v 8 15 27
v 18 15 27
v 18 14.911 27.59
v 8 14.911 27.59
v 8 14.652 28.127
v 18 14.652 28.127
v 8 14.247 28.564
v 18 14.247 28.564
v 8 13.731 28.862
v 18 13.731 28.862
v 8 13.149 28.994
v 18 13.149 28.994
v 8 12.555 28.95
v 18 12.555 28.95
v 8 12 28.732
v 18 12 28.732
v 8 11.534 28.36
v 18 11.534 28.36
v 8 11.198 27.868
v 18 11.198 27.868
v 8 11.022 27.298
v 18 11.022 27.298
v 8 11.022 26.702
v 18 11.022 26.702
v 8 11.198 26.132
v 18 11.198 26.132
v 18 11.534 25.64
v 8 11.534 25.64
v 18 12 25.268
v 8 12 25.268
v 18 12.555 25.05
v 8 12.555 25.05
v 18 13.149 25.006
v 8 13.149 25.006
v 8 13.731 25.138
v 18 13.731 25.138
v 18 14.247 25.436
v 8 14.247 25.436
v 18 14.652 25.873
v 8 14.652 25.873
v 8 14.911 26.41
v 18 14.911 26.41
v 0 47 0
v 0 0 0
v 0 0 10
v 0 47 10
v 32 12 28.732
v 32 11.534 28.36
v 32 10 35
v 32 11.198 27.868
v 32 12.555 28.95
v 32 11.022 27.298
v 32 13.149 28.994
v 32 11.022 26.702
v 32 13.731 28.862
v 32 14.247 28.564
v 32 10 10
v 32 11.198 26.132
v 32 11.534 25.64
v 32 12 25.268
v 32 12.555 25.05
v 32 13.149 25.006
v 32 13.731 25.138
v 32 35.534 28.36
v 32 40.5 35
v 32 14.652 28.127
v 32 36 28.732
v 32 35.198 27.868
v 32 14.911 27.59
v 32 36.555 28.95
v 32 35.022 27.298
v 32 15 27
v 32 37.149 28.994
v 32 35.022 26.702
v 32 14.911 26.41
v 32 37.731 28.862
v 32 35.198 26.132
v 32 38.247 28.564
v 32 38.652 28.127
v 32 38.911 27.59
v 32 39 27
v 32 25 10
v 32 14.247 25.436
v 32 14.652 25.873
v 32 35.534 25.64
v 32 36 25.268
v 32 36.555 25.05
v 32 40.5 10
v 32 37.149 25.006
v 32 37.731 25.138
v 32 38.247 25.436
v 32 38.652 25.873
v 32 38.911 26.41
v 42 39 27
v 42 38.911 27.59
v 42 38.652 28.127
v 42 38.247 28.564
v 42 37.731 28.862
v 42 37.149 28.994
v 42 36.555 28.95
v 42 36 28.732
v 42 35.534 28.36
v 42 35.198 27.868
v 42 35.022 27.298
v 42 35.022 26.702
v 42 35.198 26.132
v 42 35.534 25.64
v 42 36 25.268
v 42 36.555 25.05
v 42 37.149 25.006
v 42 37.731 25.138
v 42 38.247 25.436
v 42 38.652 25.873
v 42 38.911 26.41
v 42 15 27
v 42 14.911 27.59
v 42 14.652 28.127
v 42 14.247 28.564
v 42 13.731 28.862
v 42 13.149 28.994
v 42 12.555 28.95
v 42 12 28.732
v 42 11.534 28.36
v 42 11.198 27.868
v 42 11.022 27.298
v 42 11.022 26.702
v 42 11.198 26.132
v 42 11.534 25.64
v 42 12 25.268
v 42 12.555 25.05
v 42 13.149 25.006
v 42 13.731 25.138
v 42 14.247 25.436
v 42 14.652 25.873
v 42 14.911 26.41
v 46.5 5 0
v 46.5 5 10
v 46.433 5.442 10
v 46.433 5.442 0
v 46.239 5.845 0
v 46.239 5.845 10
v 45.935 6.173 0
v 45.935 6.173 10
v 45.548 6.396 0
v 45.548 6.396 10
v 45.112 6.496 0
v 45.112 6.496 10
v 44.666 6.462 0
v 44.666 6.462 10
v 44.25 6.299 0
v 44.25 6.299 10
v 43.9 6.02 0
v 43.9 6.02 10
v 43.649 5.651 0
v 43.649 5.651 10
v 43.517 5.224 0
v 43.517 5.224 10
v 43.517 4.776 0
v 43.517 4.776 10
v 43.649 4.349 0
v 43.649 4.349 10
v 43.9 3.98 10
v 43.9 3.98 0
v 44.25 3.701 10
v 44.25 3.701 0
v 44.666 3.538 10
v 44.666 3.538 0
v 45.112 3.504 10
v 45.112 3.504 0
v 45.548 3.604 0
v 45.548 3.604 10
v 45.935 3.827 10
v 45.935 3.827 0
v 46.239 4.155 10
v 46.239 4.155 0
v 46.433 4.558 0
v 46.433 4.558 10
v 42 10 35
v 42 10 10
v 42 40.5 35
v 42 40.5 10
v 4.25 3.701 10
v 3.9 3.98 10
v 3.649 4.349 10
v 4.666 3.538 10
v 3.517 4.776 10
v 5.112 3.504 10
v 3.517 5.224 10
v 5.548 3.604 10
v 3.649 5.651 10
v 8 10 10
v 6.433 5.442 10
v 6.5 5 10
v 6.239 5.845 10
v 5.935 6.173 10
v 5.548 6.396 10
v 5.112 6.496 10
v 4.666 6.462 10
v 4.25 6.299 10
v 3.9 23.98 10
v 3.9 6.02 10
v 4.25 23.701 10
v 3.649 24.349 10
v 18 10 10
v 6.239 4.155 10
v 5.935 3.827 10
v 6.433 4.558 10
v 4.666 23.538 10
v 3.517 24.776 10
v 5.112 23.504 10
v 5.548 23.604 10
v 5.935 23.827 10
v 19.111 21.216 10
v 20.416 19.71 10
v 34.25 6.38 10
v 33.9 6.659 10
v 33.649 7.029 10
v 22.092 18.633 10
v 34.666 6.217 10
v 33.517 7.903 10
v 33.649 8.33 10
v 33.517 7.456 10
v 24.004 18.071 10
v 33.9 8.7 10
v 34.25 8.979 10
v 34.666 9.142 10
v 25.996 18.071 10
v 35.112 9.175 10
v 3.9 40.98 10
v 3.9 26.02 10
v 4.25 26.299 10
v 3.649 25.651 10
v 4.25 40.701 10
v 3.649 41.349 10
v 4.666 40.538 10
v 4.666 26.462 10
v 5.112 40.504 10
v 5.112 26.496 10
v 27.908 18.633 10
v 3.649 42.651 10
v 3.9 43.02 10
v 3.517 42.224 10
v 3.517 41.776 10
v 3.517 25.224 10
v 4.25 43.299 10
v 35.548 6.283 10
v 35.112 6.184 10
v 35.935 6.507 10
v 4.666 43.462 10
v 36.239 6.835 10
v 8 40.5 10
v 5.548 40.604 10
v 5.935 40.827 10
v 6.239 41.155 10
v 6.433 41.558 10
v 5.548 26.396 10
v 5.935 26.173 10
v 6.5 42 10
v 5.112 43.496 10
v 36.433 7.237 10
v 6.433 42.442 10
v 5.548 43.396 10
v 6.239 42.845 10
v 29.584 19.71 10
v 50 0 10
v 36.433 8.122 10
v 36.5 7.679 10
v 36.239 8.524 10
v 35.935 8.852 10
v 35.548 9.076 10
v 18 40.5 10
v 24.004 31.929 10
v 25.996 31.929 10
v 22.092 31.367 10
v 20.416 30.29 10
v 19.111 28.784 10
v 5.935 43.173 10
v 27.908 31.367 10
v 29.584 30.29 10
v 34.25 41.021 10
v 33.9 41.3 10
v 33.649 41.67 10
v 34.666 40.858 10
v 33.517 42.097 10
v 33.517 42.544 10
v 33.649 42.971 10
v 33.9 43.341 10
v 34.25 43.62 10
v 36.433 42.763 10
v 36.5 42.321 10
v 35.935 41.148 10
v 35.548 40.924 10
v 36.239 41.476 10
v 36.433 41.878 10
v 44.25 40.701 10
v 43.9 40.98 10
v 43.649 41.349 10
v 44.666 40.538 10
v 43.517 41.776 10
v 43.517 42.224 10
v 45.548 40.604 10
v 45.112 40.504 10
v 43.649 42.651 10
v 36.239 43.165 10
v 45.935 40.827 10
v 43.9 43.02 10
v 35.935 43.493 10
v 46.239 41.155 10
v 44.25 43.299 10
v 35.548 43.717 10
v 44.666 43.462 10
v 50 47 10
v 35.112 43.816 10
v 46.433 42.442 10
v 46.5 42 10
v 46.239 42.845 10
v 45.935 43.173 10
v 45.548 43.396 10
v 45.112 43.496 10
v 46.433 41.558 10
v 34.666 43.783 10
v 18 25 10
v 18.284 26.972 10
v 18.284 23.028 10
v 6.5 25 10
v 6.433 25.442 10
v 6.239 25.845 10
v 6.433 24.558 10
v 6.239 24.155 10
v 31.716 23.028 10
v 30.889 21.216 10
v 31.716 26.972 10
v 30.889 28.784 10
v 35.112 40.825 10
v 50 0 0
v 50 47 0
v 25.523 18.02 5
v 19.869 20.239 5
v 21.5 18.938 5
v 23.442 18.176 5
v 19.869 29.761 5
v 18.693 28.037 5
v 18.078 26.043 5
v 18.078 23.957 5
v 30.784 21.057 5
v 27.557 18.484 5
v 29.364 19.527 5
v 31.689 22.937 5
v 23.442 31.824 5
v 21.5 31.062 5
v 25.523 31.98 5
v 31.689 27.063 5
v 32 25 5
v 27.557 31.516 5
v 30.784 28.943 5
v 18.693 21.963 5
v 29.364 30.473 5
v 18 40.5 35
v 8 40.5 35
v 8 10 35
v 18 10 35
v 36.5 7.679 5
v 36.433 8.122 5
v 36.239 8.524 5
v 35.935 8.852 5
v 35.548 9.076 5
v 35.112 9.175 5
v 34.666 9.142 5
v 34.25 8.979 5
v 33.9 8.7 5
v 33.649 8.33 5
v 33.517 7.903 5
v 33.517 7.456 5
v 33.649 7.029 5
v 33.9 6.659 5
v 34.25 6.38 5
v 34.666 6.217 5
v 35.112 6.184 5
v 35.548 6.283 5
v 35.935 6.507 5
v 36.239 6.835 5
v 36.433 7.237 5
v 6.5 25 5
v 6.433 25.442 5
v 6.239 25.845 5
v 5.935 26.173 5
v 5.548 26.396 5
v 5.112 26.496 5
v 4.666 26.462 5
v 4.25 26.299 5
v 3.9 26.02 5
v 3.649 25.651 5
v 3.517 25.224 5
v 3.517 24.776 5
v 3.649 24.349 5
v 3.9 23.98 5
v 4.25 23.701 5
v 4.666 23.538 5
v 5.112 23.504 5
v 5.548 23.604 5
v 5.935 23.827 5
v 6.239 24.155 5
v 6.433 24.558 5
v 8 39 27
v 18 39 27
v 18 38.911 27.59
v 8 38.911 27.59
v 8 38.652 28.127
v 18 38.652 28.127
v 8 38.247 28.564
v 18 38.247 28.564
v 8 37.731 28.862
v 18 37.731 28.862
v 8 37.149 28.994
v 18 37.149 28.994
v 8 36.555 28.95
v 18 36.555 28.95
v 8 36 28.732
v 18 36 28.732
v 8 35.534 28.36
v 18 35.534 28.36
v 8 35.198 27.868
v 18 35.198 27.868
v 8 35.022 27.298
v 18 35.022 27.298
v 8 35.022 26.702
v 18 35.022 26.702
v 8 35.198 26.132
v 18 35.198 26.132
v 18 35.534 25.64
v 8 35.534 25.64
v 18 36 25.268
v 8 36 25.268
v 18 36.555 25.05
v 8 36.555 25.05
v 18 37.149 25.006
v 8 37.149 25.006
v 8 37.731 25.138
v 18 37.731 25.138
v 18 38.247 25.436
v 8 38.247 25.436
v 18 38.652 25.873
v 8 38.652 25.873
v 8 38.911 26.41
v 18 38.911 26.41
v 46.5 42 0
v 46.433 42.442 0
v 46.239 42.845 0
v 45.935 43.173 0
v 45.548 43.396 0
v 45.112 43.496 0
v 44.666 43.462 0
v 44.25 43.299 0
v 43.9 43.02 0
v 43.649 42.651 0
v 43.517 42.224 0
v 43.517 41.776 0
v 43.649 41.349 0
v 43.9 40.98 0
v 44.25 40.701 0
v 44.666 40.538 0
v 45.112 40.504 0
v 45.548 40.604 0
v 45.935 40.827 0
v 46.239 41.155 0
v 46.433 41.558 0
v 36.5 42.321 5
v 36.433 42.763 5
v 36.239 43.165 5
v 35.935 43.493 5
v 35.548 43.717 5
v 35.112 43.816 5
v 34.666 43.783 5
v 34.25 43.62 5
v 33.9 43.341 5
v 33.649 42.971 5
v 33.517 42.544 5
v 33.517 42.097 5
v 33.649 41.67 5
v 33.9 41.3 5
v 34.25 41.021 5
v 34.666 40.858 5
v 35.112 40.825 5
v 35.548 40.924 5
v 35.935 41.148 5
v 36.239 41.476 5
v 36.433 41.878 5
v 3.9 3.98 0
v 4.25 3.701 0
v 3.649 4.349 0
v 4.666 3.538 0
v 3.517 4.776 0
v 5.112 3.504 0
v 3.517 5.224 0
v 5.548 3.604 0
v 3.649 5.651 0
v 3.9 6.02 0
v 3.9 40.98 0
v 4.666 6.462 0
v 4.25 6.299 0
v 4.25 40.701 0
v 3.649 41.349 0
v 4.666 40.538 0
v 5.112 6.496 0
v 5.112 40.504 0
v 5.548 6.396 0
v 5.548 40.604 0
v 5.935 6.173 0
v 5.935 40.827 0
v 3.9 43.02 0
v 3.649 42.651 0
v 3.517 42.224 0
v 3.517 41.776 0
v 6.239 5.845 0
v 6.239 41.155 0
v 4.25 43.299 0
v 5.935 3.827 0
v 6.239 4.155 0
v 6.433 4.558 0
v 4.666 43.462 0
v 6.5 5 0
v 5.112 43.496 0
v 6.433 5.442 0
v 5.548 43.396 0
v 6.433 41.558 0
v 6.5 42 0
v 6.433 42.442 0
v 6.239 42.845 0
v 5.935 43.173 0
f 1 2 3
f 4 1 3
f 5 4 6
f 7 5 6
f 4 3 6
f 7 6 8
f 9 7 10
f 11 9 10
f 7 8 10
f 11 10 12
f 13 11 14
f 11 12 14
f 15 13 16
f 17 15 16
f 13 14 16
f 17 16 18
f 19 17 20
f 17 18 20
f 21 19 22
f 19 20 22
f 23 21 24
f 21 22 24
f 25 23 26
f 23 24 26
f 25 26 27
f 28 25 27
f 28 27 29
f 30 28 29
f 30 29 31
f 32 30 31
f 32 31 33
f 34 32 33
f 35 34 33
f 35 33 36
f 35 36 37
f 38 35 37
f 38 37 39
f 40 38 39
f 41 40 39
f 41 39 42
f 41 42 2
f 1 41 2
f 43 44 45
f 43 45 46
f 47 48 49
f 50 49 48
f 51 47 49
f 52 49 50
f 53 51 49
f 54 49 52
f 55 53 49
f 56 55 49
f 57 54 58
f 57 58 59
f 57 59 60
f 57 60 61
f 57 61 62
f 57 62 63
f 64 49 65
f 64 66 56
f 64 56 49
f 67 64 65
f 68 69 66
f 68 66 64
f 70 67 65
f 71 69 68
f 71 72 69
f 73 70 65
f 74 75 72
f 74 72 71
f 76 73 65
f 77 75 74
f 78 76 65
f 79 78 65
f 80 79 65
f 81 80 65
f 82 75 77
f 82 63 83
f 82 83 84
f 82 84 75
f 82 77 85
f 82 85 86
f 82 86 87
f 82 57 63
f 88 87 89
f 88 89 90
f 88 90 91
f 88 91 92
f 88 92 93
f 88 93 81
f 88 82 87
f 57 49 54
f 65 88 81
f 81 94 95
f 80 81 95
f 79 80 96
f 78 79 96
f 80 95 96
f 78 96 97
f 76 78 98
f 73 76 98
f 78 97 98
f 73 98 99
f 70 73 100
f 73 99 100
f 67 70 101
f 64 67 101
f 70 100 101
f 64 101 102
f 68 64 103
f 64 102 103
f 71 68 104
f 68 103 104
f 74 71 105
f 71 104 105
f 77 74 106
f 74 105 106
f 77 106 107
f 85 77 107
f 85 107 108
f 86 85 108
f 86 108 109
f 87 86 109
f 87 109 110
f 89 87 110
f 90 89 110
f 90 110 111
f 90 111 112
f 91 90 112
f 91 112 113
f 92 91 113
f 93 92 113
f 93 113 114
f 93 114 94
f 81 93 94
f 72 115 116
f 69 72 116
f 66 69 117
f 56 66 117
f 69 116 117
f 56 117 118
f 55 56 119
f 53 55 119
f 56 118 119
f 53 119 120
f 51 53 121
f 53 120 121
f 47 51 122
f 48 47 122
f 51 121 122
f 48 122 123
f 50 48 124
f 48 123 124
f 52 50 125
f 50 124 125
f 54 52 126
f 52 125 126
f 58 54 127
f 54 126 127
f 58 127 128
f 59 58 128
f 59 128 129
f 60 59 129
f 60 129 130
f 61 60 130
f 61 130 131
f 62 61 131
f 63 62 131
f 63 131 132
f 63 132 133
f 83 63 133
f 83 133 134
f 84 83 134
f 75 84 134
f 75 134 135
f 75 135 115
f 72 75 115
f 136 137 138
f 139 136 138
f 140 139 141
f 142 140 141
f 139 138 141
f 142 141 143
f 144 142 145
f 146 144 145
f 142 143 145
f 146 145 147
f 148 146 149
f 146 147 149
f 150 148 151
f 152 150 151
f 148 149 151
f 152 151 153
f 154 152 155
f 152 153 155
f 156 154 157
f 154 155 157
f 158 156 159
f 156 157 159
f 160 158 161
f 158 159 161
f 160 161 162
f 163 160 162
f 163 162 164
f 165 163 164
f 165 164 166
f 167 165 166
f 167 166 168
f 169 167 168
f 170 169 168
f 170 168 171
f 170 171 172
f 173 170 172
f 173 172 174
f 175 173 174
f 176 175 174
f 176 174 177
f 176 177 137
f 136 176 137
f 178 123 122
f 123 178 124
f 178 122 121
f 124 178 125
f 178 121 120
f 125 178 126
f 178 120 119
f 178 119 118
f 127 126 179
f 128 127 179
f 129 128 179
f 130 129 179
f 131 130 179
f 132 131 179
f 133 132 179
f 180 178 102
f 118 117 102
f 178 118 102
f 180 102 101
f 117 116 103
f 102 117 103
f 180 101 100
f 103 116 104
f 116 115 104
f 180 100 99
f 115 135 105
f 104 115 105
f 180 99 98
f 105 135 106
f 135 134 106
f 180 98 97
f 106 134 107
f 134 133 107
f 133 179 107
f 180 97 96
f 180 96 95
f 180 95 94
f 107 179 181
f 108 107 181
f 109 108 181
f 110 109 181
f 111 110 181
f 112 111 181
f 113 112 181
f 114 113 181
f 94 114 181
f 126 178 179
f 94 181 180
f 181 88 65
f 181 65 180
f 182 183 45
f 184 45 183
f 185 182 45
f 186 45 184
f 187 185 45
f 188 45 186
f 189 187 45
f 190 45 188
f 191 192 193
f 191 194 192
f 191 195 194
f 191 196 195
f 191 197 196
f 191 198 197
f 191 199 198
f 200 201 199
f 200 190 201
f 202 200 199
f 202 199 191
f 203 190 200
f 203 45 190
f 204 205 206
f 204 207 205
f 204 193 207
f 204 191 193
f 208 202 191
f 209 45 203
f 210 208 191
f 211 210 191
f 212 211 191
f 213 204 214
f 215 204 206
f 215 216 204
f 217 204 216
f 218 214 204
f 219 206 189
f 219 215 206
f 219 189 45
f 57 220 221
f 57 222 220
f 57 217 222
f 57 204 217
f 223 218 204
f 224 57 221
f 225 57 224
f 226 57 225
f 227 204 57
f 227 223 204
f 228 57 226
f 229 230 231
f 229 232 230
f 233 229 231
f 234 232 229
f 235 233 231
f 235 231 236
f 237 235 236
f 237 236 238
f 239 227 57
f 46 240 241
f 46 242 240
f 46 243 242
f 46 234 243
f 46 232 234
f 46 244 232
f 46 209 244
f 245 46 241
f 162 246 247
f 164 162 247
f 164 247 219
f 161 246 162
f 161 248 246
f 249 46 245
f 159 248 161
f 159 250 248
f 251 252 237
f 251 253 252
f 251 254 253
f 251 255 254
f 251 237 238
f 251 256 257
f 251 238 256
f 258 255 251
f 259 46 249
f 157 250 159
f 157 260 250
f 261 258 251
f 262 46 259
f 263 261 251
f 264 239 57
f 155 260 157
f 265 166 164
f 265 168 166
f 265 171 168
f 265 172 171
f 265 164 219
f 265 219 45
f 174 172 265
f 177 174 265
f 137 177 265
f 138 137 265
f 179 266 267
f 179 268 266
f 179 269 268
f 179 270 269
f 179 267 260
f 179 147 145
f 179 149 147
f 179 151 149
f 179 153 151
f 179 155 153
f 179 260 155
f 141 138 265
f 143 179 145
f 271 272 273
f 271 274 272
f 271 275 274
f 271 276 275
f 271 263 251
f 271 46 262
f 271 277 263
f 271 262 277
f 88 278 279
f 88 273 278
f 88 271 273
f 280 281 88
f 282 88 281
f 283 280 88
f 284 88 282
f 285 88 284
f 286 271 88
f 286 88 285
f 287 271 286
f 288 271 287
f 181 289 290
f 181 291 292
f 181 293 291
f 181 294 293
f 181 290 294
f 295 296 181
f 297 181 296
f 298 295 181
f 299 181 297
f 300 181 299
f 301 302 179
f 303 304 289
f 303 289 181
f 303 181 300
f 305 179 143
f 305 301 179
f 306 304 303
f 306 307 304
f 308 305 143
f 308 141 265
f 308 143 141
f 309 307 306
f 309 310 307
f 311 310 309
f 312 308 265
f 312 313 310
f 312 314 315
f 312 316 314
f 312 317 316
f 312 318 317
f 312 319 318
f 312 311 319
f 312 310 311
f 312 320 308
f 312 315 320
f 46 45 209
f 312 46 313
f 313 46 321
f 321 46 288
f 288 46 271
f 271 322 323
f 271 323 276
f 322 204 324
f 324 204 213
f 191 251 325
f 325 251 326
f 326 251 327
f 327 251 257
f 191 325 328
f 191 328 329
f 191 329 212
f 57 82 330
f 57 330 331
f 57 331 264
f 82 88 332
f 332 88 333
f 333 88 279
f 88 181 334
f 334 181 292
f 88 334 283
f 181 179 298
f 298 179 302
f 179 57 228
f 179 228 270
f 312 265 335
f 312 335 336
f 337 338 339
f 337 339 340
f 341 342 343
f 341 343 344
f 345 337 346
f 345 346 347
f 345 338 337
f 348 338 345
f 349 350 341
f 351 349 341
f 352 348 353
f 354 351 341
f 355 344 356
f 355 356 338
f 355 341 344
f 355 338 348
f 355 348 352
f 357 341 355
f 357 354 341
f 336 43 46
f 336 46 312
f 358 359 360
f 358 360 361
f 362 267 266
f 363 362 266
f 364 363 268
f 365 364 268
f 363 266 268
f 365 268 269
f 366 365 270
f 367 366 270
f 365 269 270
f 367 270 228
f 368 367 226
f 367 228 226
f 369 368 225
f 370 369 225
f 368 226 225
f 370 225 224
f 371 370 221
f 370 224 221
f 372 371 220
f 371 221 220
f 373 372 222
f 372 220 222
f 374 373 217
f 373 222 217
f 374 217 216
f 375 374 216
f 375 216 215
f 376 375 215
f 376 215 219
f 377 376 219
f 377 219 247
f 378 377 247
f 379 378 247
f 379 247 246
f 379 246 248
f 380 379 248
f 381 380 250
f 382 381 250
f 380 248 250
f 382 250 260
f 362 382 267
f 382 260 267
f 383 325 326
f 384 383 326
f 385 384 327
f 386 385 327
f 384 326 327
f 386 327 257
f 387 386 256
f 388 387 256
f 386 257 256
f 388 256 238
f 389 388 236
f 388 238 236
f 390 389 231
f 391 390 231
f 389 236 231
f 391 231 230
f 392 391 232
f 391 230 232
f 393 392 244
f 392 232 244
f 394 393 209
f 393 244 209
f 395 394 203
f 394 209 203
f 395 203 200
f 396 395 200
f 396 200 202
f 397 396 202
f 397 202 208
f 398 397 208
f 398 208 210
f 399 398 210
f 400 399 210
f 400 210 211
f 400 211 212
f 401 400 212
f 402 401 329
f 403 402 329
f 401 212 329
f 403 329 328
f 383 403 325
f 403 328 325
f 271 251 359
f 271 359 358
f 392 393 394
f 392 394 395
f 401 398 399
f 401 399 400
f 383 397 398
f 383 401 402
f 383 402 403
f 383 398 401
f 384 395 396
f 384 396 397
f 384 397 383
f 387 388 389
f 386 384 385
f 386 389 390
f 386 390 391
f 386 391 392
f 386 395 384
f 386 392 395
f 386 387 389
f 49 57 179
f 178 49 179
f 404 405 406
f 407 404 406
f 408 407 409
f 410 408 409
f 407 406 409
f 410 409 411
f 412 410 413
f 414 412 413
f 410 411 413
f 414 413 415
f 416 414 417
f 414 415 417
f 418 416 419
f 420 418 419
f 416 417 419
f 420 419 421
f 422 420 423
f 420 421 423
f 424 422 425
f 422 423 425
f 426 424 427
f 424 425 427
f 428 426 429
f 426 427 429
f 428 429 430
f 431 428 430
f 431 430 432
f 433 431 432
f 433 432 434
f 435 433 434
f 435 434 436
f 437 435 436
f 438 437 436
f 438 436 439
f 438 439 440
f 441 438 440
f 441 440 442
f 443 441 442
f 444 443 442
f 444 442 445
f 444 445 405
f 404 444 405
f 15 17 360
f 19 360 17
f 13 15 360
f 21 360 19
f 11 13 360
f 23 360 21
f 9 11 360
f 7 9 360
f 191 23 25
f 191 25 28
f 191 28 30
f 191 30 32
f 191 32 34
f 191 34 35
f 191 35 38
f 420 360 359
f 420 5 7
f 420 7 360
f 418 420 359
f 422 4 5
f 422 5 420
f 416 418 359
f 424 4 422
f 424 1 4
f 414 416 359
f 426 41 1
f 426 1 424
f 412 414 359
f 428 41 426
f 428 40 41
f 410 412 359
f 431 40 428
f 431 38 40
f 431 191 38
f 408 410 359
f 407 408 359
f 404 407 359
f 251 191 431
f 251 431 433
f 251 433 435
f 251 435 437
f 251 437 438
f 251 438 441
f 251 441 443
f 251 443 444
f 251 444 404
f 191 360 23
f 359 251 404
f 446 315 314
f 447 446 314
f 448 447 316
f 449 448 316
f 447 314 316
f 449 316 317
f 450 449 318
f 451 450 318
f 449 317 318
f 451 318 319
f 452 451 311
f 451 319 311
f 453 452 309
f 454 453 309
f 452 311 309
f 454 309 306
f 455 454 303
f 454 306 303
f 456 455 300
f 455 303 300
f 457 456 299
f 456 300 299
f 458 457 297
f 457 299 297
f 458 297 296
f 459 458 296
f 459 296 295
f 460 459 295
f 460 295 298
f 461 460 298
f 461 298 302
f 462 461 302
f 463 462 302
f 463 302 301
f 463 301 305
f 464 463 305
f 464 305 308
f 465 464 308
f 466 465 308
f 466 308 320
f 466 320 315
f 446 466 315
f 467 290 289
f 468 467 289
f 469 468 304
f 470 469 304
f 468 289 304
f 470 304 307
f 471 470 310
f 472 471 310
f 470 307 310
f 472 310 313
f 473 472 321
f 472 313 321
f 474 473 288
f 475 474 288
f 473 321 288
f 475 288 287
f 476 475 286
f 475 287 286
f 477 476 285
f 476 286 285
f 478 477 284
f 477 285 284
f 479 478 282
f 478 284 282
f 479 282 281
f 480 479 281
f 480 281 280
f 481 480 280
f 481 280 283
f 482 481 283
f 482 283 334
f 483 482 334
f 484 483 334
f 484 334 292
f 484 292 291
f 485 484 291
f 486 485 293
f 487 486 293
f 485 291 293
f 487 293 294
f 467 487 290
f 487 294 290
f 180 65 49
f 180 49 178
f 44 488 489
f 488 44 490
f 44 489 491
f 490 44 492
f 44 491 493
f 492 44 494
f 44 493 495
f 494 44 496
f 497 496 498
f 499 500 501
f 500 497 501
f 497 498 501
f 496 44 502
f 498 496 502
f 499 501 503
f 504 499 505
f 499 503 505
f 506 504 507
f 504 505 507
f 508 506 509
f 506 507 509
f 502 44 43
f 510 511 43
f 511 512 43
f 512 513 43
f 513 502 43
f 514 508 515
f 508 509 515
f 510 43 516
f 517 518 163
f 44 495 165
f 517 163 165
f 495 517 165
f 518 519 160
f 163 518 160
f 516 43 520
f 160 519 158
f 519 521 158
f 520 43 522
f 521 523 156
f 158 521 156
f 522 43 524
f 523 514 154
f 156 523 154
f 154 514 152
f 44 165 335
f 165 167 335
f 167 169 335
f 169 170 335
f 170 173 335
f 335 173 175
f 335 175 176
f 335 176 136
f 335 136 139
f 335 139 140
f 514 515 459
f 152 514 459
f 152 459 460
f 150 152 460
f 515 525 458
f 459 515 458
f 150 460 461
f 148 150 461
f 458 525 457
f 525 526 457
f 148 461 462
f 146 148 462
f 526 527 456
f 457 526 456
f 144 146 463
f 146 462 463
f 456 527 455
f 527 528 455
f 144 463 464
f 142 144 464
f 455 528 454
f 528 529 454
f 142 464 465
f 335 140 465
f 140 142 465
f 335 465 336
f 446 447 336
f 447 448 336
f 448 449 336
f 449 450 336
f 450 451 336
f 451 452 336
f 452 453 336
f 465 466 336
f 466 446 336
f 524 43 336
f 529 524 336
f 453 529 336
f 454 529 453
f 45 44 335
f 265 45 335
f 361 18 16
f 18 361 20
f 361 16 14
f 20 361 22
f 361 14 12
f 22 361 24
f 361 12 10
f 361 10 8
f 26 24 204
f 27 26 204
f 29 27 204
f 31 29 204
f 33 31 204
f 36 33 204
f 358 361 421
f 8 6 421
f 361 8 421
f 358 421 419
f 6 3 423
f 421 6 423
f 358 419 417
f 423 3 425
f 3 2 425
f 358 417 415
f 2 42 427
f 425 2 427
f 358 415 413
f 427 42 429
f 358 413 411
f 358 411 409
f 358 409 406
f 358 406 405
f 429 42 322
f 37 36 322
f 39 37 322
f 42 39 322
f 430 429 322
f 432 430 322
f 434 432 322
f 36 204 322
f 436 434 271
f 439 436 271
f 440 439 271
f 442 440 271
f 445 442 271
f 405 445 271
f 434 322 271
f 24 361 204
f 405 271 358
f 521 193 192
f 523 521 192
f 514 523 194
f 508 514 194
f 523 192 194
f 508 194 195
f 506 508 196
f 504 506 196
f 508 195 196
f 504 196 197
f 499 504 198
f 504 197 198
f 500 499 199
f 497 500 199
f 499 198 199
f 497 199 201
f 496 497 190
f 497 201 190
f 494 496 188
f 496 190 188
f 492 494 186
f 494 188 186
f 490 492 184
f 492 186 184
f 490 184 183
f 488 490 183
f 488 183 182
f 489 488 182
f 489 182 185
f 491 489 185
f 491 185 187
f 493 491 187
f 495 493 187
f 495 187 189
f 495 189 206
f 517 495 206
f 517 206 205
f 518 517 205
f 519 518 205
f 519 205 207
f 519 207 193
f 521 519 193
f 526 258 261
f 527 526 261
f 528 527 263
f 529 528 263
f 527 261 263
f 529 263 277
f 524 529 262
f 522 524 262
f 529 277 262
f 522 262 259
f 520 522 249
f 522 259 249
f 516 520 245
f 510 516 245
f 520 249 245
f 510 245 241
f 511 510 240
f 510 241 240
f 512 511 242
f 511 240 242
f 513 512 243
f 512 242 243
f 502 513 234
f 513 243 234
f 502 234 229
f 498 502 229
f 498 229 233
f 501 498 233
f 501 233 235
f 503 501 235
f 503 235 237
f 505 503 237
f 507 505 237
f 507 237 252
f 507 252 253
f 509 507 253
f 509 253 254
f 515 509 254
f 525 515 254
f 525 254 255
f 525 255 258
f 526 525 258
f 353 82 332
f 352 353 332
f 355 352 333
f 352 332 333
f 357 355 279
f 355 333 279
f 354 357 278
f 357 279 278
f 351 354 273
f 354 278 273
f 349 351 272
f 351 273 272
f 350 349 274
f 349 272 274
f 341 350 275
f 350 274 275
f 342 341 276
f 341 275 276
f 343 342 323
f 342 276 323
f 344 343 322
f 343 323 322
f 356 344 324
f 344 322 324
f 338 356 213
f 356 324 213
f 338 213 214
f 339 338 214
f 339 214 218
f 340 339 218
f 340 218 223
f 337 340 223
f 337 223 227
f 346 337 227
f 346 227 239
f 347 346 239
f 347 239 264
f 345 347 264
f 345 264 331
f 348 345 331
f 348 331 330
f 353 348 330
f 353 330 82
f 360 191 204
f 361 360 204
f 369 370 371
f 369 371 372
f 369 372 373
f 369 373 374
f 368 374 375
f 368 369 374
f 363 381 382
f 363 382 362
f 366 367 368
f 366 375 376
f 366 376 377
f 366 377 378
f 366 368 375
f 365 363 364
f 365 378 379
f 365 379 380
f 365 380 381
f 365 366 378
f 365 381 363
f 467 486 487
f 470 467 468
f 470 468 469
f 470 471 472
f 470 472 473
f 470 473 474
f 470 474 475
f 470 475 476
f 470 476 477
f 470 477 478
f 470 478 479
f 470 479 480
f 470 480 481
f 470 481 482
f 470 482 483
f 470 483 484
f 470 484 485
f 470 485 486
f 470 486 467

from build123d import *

# Parameters (mm, degrees)
SKETCH_W        = 70
SKETCH_H        = 47
PAD_DEPTH       = 10
SKETCH001_R     = 7
SKETCH001_R_2   = 1.5
POCKET_DEPTH    = 5
SKETCH002_R     = 1.5
SKETCH002_W     = 20
SKETCH002_H     = 70
POCKET001_DEPTH = 10.001
SKETCH003_W     = 10
SKETCH003_H     = 30.5
PAD001_DEPTH    = 25
SKETCH005_R     = 2
POCKET002_DEPTH = 42.001


with BuildPart() as part:
    # Sketch → Pad (new body)
    with BuildSketch(Plane.XY):
        with Locations((35, 23.5)):
            Rectangle(SKETCH_W, SKETCH_H)
    extrude(amount=PAD_DEPTH)

    # Sketch001 → Pocket (cut)
    with BuildSketch(Plane.XY.offset(10)):
        with Locations((25, 25)):
            Circle(SKETCH001_R)
        with Locations((5, 25)):
            Circle(SKETCH001_R_2)
        with Locations((35, 42.320508)):
            Circle(SKETCH001_R_2)
        with Locations((35, 7.679492)):
            Circle(SKETCH001_R_2)
    extrude(amount=-POCKET_DEPTH, mode=Mode.SUBTRACT)

    # Sketch002 → Pocket001 (cut, through all)
    with BuildSketch(Plane.XY.offset(10)):
        with Locations((5, 42)):
            Circle(SKETCH002_R)
        with Locations((5, 5)):
            Circle(SKETCH002_R)
        with Locations((45, 5)):
            Circle(SKETCH002_R)
        with Locations((45, 42)):
            Circle(SKETCH002_R)
        with Locations((60, 15)):
            Rectangle(SKETCH002_W, SKETCH002_H)
    extrude(amount=-POCKET001_DEPTH, mode=Mode.SUBTRACT)

    # Sketch003 → Pad001 (new body)
    with BuildSketch(Plane.XY.offset(10)):
        with Locations((13, 25.25)):
            Rectangle(SKETCH003_W, SKETCH003_H)
        with Locations((37, 25.25)):
            Rectangle(SKETCH003_W, SKETCH003_H)
    extrude(amount=PAD001_DEPTH)

    # Sketch005 → Pocket002 (cut, through all)
    with BuildSketch(Plane.YZ.offset(42)):
        with Locations((13, 27)):
            Circle(SKETCH005_R)
        with Locations((37, 27)):
            Circle(SKETCH005_R)
    extrude(amount=-POCKET002_DEPTH, mode=Mode.SUBTRACT)


solid = part.part
